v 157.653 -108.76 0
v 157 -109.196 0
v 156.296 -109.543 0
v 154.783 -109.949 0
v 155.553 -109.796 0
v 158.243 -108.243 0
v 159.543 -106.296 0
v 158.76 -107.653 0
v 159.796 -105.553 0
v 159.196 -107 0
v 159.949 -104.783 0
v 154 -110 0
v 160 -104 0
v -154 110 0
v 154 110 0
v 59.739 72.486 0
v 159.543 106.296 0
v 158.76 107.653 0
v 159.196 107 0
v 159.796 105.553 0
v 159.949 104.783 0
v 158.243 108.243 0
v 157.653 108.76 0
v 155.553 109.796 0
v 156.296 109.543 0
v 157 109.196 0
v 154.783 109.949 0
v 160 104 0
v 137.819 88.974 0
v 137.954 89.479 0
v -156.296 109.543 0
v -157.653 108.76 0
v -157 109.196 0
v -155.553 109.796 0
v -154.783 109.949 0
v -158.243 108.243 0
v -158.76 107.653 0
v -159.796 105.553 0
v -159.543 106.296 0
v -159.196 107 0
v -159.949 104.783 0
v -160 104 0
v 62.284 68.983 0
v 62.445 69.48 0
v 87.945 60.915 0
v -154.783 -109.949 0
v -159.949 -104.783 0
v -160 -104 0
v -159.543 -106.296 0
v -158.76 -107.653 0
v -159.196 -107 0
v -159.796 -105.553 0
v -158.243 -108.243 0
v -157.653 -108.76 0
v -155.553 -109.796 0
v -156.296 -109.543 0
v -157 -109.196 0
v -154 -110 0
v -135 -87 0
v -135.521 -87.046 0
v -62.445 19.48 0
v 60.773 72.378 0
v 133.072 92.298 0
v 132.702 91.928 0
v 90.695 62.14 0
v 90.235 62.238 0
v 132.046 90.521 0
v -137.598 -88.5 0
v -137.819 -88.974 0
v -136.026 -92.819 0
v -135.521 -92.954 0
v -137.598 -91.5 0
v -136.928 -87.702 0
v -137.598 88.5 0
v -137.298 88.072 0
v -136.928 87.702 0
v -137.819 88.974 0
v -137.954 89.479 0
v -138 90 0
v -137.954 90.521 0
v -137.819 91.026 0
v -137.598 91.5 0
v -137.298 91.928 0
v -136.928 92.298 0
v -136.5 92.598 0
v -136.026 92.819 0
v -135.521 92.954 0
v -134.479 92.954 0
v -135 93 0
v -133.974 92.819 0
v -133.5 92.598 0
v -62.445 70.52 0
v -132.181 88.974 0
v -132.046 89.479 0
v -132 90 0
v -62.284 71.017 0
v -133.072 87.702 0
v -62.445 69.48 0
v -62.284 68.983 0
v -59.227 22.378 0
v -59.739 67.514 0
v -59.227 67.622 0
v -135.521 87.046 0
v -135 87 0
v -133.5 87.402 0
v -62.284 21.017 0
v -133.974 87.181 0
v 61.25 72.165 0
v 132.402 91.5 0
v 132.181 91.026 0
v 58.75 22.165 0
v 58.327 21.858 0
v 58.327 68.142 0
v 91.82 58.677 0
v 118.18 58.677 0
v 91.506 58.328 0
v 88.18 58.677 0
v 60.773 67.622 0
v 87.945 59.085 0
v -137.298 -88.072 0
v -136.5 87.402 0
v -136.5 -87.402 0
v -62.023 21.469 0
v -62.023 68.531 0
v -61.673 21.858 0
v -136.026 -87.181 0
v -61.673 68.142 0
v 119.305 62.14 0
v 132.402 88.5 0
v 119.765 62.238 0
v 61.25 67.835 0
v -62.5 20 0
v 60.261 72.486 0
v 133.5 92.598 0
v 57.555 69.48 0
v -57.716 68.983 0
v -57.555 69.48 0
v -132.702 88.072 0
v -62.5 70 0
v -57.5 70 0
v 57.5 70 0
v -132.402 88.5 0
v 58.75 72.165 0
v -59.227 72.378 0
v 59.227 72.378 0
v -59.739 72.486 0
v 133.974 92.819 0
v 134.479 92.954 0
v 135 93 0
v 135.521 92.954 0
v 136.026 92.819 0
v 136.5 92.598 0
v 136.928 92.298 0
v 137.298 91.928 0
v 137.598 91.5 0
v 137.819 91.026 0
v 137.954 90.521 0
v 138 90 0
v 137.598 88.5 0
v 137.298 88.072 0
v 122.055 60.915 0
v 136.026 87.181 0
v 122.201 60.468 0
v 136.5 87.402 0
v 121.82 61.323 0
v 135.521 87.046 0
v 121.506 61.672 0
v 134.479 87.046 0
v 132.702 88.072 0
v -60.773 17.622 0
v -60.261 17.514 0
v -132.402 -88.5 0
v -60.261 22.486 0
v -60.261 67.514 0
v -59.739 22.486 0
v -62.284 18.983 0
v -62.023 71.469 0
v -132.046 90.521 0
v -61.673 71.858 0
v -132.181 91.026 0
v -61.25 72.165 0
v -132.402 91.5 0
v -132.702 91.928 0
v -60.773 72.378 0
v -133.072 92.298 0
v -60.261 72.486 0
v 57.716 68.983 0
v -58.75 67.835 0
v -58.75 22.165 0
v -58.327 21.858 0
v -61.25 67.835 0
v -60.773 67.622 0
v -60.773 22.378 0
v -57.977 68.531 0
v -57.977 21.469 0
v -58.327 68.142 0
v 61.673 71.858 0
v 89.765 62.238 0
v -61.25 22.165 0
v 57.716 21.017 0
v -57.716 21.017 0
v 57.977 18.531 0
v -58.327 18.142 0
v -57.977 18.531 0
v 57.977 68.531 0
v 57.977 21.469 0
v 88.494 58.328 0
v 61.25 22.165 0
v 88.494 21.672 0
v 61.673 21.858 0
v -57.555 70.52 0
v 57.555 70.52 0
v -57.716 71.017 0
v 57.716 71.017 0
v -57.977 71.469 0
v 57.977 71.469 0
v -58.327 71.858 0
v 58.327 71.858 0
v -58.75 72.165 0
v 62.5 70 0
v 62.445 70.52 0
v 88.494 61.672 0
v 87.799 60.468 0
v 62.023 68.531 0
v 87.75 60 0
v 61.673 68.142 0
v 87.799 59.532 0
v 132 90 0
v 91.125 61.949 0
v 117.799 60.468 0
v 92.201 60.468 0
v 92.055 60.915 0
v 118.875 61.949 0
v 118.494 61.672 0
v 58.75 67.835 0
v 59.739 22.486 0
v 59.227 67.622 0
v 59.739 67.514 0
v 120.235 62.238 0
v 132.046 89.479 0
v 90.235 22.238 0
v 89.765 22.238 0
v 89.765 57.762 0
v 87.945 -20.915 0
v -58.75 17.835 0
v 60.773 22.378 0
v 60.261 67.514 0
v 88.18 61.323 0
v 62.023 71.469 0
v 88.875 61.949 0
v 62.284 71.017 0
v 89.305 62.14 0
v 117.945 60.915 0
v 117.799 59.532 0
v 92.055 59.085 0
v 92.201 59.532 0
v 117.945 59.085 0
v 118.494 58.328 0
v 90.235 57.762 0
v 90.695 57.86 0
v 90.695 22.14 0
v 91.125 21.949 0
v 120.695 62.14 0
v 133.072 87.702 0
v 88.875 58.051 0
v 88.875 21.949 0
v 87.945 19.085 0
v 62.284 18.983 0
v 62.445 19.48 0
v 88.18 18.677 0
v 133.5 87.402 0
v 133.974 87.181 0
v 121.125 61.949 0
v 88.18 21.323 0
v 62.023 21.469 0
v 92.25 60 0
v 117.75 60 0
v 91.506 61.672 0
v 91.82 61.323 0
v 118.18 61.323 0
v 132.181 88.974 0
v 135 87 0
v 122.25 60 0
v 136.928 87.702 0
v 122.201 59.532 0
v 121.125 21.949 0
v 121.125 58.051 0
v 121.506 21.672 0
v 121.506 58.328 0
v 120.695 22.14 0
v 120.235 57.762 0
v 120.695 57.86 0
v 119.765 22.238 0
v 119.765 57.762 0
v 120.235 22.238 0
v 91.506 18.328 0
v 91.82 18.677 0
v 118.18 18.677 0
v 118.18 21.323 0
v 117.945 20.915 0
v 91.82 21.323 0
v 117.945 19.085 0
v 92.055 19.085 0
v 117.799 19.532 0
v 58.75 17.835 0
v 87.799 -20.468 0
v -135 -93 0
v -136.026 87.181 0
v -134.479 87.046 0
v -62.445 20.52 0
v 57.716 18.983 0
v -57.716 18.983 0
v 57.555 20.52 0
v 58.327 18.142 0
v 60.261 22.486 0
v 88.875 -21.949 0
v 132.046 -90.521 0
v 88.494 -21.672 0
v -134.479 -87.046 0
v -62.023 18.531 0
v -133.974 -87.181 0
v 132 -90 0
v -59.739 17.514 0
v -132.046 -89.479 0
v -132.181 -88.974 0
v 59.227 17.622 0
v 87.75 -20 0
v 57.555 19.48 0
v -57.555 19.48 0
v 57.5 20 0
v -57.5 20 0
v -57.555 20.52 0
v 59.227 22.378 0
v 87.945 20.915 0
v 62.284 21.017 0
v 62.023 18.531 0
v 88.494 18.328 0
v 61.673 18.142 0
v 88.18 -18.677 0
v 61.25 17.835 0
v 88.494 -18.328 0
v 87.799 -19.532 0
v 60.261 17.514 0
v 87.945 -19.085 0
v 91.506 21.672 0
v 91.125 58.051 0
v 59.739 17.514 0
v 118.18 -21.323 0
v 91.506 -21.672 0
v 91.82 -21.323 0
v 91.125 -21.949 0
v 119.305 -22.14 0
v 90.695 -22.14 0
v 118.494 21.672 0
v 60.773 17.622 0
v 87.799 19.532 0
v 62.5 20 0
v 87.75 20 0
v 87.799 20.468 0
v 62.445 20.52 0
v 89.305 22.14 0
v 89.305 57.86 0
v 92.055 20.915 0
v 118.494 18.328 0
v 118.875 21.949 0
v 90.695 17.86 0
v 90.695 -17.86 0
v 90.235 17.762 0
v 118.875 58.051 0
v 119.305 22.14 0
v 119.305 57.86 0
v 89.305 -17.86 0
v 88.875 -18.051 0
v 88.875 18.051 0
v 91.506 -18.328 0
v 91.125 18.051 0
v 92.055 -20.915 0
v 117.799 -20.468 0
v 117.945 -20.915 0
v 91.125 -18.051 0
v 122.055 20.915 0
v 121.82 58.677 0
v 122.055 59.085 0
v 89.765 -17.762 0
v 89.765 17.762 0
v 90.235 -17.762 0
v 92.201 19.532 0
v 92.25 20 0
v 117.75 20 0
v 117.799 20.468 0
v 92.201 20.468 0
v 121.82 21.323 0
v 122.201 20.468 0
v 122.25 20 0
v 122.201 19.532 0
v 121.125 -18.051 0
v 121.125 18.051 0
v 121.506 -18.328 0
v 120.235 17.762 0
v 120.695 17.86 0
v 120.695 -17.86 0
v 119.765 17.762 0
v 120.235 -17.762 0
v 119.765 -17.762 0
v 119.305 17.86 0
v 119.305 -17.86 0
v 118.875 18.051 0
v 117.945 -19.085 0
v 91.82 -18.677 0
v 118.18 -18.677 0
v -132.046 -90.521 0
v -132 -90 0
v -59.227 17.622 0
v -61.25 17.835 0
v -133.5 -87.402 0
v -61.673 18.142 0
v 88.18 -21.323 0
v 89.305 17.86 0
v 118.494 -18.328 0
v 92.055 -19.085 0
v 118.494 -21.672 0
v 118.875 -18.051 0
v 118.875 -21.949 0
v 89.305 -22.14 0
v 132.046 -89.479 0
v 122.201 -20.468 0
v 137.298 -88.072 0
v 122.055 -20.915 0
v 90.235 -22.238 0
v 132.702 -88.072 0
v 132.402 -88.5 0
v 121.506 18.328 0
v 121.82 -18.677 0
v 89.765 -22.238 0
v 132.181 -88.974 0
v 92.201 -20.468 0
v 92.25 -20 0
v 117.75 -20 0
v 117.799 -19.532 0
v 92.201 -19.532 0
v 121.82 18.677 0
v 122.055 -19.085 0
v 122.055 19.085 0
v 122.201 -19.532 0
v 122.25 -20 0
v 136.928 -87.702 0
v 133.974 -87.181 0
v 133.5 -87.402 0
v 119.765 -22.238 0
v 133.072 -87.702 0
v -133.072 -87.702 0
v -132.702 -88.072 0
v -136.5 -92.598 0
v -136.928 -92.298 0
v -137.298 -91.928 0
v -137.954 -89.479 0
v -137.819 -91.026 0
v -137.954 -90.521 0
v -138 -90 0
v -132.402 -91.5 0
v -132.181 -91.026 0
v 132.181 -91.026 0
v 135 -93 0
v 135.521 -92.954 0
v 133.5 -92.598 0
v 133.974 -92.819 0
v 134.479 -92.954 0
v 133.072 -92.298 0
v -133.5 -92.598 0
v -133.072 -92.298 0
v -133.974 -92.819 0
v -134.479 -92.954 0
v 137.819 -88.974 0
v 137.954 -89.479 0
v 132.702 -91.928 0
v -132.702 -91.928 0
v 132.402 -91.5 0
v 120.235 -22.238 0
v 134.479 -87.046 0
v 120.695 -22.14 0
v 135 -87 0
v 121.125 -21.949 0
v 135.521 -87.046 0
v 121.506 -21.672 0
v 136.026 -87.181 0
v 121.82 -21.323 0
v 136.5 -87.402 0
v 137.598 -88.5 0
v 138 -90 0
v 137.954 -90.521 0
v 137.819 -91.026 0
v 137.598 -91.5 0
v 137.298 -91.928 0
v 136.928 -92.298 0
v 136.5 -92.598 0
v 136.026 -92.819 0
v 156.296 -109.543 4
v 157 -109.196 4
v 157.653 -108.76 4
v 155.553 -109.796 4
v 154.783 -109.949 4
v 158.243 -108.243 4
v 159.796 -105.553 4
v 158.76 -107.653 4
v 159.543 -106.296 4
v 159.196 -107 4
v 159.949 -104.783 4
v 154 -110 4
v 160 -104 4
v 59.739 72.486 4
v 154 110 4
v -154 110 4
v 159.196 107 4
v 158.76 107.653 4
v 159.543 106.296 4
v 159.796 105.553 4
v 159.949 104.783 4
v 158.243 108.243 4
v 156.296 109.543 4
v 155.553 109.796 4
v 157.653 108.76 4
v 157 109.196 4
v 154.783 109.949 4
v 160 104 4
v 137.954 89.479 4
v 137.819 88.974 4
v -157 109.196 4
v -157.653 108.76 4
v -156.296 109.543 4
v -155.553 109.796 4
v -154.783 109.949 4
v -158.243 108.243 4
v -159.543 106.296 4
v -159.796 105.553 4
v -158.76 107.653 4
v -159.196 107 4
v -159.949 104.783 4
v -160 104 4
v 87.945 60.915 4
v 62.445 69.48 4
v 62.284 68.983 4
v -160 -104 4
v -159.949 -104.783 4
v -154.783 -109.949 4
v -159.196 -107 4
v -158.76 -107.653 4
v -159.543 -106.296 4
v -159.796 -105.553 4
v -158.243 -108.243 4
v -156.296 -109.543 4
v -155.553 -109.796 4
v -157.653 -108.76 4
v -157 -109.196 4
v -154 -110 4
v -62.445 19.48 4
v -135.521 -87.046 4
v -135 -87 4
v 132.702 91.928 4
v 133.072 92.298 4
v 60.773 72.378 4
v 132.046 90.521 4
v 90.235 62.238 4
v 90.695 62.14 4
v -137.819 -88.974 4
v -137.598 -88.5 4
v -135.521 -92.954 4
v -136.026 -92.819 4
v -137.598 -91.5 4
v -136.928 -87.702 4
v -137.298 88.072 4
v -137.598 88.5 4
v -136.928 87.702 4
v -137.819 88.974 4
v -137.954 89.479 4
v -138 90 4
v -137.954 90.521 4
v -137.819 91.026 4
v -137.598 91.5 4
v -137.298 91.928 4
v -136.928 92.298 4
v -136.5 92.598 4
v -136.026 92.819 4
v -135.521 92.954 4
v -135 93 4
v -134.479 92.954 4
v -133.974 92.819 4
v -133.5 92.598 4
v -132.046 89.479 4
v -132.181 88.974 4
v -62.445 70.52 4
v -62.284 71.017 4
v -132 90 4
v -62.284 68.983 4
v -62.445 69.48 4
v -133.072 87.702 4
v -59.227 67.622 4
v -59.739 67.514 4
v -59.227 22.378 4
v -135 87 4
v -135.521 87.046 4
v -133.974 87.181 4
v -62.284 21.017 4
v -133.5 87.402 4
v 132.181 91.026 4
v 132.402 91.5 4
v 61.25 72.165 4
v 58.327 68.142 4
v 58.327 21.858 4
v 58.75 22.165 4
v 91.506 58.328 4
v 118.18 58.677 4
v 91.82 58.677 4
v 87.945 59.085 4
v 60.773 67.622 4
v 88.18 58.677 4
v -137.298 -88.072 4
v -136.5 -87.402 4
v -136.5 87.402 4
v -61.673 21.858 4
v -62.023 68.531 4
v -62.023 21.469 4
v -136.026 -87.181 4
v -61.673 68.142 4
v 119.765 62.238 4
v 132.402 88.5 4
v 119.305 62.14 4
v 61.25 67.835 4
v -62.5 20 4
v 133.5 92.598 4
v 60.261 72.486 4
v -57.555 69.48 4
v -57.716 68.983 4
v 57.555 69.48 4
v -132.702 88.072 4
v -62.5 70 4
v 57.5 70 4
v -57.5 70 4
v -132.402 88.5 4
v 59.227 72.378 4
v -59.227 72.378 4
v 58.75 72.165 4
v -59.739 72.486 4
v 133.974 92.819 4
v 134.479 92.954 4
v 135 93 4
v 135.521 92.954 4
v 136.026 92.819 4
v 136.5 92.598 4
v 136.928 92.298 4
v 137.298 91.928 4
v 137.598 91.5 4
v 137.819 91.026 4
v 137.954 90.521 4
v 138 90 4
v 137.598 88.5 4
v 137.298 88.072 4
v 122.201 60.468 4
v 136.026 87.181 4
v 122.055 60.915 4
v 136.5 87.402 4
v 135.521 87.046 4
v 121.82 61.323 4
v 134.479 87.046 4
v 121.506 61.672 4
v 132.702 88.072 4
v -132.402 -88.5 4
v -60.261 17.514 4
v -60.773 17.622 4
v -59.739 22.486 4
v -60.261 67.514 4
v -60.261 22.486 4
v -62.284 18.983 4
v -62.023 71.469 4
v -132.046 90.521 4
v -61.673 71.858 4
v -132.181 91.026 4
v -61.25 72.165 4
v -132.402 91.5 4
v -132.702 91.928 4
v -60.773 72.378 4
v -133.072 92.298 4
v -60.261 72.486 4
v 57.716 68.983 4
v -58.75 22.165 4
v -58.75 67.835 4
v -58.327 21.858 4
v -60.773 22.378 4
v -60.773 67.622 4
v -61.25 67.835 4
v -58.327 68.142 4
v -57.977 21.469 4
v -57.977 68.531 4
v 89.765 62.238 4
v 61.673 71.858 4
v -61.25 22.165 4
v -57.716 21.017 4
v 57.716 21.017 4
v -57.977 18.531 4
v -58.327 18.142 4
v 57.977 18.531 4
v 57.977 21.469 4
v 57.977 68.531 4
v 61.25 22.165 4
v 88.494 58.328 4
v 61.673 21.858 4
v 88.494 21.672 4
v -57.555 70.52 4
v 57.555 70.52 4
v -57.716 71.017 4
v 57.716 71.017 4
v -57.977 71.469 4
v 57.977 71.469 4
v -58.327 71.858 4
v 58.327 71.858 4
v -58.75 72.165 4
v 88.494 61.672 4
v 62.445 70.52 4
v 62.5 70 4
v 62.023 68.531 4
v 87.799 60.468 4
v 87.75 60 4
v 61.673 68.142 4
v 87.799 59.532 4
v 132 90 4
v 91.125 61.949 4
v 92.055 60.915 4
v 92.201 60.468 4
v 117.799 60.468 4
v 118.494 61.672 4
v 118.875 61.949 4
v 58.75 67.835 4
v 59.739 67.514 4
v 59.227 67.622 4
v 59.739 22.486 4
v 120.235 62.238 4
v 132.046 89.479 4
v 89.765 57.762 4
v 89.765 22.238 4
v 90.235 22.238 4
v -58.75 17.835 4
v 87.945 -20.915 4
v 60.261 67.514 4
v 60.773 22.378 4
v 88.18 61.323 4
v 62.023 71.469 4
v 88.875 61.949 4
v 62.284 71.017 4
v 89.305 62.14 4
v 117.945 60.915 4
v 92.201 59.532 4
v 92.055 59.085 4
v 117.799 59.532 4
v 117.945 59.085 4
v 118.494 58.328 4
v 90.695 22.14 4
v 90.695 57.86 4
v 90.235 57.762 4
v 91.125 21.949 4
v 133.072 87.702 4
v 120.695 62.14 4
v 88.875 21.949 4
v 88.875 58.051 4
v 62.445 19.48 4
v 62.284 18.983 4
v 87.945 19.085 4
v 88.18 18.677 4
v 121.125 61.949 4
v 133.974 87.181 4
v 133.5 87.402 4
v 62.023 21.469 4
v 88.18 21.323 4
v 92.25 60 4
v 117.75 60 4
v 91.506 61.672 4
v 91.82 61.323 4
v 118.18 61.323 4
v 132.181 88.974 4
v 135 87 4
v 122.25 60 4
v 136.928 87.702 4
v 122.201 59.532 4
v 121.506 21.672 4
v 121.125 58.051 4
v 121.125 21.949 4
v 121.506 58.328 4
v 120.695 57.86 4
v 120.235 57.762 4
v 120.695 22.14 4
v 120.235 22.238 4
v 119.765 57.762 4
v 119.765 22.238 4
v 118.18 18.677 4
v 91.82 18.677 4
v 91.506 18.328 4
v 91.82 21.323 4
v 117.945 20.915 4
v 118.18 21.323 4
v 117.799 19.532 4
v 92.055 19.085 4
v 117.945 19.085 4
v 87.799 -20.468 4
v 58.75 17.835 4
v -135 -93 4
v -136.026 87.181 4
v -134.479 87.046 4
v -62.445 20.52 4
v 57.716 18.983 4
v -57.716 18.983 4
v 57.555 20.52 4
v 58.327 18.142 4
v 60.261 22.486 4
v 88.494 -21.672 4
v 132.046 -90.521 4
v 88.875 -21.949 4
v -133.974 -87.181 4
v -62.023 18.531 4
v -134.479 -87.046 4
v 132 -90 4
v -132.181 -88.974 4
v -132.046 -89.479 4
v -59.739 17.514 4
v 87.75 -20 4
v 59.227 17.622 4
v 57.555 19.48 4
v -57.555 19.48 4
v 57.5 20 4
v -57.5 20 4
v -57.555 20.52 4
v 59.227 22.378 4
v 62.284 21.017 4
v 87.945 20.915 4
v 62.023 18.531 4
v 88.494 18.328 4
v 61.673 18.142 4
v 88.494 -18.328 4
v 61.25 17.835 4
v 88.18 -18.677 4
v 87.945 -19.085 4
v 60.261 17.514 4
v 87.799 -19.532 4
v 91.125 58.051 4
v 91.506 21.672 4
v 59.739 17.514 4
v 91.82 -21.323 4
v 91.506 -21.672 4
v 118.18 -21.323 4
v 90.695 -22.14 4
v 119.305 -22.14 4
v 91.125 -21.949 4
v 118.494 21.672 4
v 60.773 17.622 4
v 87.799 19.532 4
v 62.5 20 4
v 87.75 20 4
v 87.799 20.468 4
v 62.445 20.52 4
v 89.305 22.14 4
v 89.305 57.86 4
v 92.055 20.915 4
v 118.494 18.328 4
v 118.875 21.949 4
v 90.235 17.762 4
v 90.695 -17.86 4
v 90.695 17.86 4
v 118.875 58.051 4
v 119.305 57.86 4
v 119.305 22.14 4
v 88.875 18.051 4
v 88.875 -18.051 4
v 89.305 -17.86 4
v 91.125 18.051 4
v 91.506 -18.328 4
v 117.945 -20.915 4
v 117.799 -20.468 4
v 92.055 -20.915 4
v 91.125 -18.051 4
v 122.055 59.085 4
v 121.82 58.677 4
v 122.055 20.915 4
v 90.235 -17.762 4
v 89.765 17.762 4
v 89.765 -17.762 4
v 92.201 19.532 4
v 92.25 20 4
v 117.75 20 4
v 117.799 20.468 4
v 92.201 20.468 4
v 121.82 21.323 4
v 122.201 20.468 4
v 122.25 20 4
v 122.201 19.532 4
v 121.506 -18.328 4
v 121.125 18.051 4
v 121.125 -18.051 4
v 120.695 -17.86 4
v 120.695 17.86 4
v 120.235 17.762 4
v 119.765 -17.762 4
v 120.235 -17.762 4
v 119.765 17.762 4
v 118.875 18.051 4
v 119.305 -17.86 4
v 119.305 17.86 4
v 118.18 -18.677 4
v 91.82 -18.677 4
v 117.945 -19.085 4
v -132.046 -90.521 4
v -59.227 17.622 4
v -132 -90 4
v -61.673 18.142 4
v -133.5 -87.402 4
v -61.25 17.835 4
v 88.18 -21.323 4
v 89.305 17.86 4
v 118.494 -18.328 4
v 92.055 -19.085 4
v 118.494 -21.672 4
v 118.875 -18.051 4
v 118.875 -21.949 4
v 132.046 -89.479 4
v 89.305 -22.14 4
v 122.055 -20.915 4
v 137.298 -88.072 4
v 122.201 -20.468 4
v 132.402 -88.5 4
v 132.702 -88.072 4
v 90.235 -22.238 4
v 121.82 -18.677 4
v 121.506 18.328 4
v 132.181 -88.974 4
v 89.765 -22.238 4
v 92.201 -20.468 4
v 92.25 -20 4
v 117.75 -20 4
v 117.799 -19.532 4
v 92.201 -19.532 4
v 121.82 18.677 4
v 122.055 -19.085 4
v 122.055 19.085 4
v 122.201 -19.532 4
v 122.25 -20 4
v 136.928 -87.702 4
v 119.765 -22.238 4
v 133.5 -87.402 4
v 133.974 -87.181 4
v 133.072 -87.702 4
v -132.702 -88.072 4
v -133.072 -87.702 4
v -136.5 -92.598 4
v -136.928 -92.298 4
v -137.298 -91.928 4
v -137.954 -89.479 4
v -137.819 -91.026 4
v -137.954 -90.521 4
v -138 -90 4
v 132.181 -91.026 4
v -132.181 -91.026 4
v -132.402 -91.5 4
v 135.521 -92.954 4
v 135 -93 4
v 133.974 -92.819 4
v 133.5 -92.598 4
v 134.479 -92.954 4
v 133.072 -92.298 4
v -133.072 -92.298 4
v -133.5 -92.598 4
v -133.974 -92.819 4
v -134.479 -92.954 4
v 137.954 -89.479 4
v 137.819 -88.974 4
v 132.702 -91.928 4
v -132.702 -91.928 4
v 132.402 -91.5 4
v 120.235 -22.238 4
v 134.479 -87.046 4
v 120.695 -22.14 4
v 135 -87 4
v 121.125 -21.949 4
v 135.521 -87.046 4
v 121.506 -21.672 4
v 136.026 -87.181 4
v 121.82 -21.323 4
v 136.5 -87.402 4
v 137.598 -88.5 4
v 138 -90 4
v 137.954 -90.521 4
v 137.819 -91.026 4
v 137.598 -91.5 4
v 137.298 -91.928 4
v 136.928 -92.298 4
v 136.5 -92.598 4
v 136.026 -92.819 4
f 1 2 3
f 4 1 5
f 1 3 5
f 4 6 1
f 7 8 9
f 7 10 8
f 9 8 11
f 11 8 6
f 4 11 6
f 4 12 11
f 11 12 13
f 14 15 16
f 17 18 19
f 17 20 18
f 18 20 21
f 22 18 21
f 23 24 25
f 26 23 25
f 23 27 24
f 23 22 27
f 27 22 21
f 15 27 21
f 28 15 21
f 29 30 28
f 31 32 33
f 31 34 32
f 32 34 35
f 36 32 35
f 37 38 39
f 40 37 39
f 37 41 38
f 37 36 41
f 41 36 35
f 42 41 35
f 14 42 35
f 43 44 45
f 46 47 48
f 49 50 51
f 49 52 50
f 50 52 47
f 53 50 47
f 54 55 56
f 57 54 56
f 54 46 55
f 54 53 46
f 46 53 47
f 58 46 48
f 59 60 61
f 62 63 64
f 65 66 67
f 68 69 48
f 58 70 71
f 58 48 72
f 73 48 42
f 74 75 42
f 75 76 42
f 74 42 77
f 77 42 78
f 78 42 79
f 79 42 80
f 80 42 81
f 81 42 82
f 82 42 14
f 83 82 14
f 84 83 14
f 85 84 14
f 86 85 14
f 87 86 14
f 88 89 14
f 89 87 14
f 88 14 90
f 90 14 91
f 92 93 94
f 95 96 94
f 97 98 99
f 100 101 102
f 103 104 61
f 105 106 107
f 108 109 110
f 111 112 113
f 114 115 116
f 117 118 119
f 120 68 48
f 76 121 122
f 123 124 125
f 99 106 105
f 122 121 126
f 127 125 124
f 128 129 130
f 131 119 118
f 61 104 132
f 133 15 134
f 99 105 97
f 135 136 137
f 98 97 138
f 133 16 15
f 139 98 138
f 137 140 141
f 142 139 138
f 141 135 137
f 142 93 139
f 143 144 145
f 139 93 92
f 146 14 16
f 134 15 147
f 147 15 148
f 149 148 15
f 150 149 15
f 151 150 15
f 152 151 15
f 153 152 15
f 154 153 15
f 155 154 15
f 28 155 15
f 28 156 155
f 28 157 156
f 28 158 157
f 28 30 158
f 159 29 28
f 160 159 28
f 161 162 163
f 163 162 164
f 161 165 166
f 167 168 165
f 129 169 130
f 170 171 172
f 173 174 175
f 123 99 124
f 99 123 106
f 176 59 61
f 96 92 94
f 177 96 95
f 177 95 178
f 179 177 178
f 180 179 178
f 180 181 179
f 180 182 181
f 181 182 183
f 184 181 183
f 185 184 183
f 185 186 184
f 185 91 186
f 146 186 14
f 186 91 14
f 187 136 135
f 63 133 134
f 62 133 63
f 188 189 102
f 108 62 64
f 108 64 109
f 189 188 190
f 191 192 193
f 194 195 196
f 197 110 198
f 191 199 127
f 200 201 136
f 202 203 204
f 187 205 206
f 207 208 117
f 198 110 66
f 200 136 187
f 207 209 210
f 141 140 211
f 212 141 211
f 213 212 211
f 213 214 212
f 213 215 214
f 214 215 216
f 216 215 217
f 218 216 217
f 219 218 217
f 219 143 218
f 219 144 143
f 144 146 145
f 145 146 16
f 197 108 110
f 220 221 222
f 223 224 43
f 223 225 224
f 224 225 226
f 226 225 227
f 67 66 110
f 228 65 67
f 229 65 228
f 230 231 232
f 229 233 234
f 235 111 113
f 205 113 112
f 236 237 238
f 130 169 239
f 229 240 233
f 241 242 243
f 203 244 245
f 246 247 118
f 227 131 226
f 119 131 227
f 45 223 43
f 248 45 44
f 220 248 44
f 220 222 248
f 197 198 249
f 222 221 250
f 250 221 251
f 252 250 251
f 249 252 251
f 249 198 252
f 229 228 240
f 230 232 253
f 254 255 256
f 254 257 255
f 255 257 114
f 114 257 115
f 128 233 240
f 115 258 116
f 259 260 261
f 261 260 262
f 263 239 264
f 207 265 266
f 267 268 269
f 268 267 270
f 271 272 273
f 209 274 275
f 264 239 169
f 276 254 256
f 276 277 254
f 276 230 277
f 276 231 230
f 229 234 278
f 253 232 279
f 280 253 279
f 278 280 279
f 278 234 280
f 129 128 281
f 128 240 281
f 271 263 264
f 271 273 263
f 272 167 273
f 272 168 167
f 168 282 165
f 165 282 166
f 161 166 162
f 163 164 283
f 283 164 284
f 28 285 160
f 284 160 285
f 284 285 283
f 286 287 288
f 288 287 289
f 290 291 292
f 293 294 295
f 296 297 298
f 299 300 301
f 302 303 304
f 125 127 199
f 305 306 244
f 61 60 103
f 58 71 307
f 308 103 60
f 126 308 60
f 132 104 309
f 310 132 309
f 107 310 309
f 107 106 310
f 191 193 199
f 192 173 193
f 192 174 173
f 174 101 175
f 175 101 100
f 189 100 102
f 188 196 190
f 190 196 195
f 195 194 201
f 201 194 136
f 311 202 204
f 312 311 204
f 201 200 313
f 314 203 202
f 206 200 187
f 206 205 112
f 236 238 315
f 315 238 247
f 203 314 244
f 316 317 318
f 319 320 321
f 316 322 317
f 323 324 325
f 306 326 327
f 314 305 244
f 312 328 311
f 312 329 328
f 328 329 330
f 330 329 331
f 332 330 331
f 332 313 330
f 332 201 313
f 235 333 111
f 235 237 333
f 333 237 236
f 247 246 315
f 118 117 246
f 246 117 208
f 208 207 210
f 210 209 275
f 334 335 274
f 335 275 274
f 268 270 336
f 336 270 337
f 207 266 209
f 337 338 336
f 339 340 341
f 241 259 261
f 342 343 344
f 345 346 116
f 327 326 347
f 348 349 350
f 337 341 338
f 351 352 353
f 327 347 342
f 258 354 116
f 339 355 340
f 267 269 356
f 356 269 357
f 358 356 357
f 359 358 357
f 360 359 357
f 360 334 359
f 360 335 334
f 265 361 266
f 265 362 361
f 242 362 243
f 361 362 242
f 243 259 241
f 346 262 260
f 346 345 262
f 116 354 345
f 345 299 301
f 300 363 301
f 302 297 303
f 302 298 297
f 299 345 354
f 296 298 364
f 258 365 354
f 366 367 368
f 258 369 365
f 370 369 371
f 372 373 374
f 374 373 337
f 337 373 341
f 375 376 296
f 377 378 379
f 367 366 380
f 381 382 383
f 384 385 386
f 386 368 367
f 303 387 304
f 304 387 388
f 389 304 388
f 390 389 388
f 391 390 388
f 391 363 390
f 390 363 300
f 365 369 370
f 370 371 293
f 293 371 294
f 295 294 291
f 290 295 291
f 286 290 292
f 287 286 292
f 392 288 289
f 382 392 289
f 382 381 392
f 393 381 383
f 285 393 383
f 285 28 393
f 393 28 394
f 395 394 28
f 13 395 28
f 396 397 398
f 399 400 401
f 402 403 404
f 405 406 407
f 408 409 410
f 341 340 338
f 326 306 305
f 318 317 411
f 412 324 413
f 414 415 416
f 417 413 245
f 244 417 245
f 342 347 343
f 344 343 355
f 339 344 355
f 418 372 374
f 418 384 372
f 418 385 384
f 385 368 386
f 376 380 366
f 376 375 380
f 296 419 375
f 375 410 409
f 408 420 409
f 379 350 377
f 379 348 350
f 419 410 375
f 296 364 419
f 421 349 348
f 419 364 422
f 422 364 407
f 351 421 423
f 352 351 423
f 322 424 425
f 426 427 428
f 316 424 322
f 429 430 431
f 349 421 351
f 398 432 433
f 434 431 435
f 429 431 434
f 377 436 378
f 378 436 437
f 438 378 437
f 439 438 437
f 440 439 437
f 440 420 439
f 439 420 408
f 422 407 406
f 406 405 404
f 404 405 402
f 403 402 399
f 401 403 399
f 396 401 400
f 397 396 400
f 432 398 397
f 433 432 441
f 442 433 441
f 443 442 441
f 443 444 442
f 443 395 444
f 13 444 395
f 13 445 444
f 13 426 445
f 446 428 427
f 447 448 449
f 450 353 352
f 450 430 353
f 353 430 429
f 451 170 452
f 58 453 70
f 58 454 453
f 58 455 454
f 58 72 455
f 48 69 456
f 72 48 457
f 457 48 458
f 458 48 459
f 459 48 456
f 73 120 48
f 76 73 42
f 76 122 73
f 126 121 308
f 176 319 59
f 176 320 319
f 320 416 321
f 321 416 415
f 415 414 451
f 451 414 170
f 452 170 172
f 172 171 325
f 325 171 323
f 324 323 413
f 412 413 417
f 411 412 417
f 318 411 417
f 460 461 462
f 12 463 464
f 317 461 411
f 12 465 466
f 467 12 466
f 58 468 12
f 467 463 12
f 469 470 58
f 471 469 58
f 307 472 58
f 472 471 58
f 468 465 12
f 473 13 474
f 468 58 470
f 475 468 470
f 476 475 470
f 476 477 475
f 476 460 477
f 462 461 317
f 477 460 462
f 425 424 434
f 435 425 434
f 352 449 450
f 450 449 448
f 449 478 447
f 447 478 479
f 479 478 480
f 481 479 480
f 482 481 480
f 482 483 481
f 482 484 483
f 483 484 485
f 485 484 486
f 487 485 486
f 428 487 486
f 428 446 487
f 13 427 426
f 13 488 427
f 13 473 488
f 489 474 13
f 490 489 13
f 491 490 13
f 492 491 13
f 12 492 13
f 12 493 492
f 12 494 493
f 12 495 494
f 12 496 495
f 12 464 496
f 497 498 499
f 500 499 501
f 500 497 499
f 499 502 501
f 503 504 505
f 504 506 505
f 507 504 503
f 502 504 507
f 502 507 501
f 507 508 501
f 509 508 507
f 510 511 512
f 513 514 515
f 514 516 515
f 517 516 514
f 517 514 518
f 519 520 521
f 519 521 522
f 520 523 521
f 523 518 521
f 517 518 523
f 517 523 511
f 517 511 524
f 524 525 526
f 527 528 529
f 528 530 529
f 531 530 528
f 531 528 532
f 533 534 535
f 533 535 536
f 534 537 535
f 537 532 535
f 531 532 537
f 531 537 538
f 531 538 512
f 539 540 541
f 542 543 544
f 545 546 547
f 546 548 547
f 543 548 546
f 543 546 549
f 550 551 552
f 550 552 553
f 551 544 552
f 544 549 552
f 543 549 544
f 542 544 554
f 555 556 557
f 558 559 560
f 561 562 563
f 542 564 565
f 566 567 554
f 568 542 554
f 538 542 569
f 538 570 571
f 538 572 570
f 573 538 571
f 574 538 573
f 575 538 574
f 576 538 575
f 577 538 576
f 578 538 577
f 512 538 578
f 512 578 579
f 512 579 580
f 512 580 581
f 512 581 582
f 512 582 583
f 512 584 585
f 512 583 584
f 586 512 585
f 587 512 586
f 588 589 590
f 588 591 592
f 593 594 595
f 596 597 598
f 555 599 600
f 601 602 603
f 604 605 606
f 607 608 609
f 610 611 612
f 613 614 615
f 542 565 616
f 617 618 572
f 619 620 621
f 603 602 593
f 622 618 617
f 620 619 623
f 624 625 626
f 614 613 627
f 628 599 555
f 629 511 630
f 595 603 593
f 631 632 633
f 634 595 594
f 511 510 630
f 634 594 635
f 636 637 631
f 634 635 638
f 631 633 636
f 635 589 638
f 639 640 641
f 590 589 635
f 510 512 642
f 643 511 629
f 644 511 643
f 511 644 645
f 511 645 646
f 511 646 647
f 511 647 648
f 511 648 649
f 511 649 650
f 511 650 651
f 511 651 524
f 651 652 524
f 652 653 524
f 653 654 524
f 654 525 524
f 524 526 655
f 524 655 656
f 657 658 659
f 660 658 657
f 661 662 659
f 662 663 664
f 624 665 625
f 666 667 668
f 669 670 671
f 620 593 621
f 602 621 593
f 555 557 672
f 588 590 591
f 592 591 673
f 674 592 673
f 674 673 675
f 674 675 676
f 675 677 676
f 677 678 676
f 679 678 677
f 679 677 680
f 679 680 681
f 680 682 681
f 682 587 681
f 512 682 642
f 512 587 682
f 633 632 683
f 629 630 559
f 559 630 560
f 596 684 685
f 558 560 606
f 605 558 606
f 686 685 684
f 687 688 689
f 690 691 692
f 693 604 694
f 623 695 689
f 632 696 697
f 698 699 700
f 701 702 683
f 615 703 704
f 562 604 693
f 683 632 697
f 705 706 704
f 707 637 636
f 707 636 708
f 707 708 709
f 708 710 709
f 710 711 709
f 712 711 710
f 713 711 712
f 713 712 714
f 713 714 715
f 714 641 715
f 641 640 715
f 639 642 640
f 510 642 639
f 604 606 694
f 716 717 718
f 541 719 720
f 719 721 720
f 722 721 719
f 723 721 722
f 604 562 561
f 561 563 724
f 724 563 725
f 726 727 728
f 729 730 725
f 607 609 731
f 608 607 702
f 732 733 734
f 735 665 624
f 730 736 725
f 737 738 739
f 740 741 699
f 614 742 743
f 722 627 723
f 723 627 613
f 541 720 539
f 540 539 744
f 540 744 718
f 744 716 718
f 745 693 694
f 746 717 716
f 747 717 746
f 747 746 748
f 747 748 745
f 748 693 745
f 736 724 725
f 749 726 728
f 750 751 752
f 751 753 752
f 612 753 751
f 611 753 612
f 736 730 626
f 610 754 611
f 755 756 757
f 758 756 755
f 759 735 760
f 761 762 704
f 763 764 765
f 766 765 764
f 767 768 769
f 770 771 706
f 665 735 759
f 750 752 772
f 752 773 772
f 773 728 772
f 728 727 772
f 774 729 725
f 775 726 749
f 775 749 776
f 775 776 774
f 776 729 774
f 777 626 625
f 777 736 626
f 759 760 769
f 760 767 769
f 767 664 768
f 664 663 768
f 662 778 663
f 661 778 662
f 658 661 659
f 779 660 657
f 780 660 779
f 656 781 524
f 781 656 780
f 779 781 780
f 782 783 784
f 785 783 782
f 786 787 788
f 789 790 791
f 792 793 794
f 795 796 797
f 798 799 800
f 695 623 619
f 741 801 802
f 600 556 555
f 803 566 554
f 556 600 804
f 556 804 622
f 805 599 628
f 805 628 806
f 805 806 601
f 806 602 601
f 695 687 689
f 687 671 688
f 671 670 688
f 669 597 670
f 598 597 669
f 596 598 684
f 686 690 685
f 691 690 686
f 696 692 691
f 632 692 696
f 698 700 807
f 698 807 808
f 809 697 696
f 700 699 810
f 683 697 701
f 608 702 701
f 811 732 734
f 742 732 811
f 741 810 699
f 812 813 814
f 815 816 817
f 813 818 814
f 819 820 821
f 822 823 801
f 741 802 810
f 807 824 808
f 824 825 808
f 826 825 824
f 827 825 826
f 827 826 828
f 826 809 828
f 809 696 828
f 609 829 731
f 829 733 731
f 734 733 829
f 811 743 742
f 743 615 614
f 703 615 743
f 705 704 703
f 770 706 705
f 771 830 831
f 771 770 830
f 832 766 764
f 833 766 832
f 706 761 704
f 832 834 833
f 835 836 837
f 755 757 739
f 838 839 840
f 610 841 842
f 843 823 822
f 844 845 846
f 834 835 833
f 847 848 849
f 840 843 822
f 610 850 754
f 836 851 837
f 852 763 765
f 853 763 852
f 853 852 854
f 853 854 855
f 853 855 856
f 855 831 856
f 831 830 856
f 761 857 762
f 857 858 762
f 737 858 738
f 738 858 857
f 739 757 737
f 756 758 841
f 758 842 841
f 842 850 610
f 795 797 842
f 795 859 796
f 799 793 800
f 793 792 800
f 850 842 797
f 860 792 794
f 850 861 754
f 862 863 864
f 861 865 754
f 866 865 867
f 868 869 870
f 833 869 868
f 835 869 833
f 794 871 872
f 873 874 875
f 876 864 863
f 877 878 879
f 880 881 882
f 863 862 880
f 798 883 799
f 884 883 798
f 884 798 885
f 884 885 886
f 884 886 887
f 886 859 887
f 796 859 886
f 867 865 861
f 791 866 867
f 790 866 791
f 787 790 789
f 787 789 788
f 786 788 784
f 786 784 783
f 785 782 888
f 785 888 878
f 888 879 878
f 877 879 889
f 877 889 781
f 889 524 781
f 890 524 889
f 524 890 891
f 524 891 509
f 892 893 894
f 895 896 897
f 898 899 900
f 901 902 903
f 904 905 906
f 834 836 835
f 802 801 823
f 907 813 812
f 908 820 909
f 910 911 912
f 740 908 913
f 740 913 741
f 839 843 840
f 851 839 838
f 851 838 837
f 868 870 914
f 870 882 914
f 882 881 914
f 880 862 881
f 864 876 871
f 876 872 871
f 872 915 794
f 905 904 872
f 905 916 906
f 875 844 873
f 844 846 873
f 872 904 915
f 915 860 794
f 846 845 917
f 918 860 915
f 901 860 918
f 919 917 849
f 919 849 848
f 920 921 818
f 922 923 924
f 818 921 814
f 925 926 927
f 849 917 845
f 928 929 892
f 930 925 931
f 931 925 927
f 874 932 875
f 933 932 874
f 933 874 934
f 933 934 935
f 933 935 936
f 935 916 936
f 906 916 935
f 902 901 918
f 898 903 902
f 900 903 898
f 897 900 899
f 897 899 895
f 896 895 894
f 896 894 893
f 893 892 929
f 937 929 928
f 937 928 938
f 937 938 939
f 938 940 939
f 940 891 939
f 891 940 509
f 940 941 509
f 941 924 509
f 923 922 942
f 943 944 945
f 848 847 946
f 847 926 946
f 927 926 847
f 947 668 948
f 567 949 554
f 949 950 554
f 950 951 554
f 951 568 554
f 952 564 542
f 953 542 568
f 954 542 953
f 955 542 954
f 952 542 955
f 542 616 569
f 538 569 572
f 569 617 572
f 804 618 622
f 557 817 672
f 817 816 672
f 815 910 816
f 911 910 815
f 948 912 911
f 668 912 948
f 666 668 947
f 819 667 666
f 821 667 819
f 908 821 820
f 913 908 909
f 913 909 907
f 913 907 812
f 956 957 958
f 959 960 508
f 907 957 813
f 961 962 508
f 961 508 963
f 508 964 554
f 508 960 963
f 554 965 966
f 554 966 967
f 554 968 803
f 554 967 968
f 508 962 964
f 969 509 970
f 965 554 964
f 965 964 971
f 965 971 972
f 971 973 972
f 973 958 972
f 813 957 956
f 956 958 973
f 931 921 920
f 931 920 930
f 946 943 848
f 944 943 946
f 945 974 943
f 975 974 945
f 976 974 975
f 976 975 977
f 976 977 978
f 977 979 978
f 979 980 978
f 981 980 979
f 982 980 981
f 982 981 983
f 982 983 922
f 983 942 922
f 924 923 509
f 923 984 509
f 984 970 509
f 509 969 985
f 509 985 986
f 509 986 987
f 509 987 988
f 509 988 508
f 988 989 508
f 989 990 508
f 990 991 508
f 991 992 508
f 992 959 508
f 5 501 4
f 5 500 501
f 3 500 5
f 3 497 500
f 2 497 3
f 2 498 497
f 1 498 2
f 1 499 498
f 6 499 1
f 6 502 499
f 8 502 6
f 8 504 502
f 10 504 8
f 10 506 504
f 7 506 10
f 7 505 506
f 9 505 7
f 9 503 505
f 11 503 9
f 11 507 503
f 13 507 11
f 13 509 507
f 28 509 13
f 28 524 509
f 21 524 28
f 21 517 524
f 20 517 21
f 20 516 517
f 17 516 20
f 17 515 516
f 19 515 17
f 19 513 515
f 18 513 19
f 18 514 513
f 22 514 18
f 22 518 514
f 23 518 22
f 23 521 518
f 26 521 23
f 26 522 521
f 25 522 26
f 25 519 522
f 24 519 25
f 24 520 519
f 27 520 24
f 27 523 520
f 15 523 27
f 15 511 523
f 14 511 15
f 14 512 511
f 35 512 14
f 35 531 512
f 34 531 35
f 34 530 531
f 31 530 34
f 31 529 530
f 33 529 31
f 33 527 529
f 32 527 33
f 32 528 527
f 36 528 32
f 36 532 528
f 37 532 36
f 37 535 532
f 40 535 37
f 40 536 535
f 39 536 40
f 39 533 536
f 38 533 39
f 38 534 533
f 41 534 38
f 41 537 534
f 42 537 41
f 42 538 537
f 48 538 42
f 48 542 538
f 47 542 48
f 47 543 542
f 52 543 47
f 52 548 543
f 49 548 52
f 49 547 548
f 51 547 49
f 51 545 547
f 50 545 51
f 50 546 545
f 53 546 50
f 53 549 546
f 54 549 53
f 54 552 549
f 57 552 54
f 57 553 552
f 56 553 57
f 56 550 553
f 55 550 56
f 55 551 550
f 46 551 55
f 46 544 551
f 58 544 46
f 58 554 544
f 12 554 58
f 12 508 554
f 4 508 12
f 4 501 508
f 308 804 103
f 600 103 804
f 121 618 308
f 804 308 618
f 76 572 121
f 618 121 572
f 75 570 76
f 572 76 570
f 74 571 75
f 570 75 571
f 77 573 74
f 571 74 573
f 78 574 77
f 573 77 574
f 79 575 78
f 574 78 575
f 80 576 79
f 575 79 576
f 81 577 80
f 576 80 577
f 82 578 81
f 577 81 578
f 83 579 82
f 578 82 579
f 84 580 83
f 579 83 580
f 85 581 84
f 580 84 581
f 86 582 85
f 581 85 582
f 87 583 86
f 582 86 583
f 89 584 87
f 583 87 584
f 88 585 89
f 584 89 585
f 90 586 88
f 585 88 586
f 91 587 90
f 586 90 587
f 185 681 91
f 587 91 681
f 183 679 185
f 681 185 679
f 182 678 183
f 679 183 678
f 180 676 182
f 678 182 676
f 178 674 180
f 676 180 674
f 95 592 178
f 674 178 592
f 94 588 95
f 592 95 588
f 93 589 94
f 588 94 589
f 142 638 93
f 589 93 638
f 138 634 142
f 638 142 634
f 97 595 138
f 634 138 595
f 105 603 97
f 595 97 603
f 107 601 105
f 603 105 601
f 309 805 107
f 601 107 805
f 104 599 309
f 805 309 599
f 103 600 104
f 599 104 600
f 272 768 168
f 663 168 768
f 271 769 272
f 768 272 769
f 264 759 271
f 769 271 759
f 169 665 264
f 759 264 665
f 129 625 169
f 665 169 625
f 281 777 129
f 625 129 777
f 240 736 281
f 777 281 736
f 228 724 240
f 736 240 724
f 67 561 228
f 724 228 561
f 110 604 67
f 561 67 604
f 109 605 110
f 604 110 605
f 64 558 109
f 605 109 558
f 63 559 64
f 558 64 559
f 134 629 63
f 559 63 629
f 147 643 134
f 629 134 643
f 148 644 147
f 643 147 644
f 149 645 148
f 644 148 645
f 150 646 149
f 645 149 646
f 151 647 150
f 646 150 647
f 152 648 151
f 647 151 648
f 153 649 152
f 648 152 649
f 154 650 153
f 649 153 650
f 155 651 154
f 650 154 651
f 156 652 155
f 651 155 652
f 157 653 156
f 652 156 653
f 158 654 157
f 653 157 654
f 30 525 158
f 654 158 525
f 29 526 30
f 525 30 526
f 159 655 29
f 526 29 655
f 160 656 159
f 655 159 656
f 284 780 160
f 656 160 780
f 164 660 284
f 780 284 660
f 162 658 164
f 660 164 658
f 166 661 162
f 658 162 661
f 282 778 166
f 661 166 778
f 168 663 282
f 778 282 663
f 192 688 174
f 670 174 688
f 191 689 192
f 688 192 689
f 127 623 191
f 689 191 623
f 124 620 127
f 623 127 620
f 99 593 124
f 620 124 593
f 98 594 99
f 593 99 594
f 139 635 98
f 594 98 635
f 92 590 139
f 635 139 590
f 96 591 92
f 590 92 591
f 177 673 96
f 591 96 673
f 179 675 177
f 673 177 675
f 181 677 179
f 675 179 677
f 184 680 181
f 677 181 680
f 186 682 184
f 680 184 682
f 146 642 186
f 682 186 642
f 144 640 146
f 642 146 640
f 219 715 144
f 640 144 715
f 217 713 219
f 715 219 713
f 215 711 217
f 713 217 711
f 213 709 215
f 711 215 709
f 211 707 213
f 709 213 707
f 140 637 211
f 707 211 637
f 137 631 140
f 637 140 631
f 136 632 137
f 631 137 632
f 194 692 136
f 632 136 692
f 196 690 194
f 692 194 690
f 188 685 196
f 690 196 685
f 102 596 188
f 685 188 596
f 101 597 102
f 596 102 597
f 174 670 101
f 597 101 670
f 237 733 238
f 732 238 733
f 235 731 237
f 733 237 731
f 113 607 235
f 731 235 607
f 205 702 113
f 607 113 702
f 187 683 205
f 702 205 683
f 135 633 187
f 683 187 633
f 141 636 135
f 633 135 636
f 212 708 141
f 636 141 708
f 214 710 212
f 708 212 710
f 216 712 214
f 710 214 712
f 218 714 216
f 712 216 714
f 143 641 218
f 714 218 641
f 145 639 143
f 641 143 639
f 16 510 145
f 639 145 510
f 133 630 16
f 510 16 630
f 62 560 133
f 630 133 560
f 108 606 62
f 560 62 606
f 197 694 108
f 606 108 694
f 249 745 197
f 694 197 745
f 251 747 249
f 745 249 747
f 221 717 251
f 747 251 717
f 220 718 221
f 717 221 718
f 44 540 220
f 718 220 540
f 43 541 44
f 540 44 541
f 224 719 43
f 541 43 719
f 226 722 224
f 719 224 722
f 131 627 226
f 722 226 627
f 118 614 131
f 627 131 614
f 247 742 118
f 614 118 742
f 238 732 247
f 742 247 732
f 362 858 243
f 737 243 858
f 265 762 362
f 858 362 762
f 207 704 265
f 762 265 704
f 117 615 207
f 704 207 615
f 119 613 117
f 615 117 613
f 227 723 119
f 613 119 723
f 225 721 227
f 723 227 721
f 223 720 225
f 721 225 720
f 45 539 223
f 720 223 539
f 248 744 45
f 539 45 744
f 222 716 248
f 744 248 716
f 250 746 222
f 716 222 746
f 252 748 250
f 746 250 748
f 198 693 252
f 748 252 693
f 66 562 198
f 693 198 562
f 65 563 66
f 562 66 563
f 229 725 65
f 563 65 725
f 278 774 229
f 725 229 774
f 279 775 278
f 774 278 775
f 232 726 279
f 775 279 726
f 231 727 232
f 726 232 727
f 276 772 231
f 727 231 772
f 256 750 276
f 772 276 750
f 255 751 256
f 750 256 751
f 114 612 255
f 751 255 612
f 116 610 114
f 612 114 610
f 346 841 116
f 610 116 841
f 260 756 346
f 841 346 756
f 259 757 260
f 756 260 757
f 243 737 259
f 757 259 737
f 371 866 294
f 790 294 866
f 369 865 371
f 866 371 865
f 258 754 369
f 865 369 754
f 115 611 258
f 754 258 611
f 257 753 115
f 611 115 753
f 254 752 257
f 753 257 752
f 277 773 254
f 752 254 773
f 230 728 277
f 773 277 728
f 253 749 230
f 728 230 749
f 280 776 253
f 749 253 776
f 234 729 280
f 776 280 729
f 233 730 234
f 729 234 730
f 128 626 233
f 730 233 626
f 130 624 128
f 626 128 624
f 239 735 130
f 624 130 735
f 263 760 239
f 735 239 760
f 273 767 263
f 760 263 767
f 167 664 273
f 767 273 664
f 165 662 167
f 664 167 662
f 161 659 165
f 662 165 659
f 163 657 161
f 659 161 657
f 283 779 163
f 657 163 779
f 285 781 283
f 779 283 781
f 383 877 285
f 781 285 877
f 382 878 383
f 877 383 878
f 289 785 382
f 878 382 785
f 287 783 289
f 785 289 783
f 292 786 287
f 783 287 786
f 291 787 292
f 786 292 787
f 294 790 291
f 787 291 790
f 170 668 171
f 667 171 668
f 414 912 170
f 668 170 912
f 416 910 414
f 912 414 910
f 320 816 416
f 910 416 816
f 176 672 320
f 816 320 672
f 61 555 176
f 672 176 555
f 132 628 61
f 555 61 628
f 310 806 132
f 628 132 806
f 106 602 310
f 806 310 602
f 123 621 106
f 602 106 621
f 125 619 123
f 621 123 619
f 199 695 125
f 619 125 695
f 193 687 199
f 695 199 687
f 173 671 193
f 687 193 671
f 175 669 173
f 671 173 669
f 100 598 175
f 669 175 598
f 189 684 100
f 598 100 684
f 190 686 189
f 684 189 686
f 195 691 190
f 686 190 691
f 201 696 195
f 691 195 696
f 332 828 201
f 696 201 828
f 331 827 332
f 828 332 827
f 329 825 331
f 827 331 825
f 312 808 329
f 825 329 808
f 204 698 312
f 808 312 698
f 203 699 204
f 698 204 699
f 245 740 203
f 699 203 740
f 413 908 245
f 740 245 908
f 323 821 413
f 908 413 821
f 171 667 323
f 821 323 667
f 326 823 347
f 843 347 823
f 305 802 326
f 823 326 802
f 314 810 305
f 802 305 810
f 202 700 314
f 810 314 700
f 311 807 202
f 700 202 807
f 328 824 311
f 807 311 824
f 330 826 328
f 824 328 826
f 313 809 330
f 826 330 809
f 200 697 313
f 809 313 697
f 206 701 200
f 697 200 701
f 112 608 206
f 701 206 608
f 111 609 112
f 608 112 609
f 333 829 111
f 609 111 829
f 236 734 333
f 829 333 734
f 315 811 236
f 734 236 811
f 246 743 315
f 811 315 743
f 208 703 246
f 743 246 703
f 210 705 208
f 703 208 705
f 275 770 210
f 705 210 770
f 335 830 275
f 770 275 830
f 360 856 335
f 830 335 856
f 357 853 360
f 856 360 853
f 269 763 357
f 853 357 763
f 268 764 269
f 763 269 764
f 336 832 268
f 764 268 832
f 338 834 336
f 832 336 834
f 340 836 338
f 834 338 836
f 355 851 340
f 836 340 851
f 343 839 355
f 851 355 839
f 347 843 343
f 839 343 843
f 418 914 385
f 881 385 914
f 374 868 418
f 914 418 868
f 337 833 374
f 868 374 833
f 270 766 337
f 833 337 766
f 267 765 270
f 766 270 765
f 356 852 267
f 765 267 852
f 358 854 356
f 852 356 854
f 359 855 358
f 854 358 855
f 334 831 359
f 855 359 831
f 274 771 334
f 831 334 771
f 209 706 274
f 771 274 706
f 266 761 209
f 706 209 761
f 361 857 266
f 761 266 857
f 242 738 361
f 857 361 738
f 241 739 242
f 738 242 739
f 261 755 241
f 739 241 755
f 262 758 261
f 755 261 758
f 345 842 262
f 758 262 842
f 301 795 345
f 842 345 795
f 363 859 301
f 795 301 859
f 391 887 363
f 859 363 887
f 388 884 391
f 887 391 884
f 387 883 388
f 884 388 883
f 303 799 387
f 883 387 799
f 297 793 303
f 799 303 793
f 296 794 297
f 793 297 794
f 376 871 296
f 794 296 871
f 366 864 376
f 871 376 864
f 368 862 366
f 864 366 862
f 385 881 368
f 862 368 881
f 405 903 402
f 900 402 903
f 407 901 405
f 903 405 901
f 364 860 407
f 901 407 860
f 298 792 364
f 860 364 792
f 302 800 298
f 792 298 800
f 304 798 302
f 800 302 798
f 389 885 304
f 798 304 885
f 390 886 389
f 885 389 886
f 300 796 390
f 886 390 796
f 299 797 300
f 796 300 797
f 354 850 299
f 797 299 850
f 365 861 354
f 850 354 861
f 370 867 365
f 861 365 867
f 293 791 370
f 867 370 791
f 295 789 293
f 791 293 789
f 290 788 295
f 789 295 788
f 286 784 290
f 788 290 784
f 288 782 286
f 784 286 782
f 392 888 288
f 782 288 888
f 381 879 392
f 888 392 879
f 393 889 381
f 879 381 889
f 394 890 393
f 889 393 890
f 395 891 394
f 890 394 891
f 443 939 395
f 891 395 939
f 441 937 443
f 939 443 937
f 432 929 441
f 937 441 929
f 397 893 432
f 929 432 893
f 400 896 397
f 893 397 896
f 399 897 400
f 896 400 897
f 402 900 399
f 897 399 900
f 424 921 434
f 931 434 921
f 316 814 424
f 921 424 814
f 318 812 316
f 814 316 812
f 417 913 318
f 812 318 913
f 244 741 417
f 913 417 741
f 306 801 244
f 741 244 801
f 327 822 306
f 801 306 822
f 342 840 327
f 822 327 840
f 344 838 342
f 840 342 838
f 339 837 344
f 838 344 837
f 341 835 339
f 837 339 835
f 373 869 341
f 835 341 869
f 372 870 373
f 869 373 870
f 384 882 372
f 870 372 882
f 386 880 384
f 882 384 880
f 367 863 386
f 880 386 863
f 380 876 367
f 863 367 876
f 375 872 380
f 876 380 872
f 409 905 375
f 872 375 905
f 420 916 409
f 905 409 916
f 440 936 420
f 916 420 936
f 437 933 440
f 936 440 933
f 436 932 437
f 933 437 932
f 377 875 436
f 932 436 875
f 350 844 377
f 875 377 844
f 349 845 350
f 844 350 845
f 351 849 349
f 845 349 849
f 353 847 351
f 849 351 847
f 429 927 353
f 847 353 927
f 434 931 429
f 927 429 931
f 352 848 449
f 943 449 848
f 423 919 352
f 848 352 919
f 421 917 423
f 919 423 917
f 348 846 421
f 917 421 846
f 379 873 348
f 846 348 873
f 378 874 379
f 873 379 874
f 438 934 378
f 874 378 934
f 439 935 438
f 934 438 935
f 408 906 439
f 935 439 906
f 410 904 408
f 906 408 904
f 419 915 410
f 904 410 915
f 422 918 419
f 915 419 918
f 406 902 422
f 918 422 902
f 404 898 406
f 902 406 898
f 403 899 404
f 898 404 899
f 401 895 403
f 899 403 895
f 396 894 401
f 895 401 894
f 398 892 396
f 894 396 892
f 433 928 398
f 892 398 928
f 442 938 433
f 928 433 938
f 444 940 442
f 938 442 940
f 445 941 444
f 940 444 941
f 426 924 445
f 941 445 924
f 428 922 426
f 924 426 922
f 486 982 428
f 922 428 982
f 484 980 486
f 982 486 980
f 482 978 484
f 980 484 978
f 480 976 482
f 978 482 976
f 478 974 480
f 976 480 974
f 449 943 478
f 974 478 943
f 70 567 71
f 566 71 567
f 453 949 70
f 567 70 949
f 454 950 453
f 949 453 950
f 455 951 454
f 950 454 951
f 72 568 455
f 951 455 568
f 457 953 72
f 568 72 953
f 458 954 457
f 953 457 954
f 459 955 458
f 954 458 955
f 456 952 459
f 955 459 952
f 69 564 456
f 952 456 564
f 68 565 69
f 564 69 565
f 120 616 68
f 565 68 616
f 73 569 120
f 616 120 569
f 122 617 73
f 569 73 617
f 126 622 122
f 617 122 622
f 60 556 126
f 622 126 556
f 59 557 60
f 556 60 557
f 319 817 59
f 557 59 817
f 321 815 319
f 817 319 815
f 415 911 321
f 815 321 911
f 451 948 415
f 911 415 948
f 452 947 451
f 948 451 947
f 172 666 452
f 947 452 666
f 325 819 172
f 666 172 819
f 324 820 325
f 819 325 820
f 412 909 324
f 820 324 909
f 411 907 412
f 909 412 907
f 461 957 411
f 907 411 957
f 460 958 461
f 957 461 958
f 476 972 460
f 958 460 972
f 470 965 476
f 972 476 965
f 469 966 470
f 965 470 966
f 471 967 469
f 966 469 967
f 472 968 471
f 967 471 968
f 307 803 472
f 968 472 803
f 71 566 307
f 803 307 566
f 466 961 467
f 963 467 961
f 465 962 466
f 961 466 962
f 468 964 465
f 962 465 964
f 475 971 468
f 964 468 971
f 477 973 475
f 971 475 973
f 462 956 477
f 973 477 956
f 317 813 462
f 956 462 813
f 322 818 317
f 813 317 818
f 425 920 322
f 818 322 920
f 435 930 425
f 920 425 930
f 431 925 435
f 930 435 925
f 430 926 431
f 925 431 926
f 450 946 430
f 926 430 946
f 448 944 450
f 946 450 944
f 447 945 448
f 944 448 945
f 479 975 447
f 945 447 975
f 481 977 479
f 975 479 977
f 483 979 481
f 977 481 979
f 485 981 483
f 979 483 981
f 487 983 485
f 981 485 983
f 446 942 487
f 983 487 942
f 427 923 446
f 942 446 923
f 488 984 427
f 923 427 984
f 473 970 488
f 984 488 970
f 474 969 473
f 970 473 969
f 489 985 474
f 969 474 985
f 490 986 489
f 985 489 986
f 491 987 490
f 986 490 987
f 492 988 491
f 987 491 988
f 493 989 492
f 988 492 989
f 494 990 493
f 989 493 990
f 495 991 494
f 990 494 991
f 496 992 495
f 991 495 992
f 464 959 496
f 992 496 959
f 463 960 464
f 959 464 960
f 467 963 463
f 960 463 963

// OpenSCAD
plate_w = 320;
plate_h = 220;
plate_t = 4;
corner_r = 6;

module rr(w,h,r){
  hull(){
    translate([-(w/2-r),-(h/2-r)]) circle(r=r,$fn=48);
    translate([ (w/2-r),-(h/2-r)]) circle(r=r,$fn=48);
    translate([-(w/2-r), (h/2-r)]) circle(r=r,$fn=48);
    translate([ (w/2-r), (h/2-r)]) circle(r=r,$fn=48);
  }
}

linear_extrude(height=plate_t)
  difference(){
    rr(plate_w, plate_h, corner_r);
    for (x=[-135,135]) for (y=[-90,90]) translate([x,y]) circle(d=6.0,$fn=36);
    // power block holes provisional
    for (x=[-60,60]) for (y=[20,70]) translate([x,y]) circle(d=5.0,$fn=30);
    // accessory holes provisional
    for (x=[90,120]) for (y=[-20,20,60]) translate([x,y]) circle(d=4.5,$fn=30);
  }
